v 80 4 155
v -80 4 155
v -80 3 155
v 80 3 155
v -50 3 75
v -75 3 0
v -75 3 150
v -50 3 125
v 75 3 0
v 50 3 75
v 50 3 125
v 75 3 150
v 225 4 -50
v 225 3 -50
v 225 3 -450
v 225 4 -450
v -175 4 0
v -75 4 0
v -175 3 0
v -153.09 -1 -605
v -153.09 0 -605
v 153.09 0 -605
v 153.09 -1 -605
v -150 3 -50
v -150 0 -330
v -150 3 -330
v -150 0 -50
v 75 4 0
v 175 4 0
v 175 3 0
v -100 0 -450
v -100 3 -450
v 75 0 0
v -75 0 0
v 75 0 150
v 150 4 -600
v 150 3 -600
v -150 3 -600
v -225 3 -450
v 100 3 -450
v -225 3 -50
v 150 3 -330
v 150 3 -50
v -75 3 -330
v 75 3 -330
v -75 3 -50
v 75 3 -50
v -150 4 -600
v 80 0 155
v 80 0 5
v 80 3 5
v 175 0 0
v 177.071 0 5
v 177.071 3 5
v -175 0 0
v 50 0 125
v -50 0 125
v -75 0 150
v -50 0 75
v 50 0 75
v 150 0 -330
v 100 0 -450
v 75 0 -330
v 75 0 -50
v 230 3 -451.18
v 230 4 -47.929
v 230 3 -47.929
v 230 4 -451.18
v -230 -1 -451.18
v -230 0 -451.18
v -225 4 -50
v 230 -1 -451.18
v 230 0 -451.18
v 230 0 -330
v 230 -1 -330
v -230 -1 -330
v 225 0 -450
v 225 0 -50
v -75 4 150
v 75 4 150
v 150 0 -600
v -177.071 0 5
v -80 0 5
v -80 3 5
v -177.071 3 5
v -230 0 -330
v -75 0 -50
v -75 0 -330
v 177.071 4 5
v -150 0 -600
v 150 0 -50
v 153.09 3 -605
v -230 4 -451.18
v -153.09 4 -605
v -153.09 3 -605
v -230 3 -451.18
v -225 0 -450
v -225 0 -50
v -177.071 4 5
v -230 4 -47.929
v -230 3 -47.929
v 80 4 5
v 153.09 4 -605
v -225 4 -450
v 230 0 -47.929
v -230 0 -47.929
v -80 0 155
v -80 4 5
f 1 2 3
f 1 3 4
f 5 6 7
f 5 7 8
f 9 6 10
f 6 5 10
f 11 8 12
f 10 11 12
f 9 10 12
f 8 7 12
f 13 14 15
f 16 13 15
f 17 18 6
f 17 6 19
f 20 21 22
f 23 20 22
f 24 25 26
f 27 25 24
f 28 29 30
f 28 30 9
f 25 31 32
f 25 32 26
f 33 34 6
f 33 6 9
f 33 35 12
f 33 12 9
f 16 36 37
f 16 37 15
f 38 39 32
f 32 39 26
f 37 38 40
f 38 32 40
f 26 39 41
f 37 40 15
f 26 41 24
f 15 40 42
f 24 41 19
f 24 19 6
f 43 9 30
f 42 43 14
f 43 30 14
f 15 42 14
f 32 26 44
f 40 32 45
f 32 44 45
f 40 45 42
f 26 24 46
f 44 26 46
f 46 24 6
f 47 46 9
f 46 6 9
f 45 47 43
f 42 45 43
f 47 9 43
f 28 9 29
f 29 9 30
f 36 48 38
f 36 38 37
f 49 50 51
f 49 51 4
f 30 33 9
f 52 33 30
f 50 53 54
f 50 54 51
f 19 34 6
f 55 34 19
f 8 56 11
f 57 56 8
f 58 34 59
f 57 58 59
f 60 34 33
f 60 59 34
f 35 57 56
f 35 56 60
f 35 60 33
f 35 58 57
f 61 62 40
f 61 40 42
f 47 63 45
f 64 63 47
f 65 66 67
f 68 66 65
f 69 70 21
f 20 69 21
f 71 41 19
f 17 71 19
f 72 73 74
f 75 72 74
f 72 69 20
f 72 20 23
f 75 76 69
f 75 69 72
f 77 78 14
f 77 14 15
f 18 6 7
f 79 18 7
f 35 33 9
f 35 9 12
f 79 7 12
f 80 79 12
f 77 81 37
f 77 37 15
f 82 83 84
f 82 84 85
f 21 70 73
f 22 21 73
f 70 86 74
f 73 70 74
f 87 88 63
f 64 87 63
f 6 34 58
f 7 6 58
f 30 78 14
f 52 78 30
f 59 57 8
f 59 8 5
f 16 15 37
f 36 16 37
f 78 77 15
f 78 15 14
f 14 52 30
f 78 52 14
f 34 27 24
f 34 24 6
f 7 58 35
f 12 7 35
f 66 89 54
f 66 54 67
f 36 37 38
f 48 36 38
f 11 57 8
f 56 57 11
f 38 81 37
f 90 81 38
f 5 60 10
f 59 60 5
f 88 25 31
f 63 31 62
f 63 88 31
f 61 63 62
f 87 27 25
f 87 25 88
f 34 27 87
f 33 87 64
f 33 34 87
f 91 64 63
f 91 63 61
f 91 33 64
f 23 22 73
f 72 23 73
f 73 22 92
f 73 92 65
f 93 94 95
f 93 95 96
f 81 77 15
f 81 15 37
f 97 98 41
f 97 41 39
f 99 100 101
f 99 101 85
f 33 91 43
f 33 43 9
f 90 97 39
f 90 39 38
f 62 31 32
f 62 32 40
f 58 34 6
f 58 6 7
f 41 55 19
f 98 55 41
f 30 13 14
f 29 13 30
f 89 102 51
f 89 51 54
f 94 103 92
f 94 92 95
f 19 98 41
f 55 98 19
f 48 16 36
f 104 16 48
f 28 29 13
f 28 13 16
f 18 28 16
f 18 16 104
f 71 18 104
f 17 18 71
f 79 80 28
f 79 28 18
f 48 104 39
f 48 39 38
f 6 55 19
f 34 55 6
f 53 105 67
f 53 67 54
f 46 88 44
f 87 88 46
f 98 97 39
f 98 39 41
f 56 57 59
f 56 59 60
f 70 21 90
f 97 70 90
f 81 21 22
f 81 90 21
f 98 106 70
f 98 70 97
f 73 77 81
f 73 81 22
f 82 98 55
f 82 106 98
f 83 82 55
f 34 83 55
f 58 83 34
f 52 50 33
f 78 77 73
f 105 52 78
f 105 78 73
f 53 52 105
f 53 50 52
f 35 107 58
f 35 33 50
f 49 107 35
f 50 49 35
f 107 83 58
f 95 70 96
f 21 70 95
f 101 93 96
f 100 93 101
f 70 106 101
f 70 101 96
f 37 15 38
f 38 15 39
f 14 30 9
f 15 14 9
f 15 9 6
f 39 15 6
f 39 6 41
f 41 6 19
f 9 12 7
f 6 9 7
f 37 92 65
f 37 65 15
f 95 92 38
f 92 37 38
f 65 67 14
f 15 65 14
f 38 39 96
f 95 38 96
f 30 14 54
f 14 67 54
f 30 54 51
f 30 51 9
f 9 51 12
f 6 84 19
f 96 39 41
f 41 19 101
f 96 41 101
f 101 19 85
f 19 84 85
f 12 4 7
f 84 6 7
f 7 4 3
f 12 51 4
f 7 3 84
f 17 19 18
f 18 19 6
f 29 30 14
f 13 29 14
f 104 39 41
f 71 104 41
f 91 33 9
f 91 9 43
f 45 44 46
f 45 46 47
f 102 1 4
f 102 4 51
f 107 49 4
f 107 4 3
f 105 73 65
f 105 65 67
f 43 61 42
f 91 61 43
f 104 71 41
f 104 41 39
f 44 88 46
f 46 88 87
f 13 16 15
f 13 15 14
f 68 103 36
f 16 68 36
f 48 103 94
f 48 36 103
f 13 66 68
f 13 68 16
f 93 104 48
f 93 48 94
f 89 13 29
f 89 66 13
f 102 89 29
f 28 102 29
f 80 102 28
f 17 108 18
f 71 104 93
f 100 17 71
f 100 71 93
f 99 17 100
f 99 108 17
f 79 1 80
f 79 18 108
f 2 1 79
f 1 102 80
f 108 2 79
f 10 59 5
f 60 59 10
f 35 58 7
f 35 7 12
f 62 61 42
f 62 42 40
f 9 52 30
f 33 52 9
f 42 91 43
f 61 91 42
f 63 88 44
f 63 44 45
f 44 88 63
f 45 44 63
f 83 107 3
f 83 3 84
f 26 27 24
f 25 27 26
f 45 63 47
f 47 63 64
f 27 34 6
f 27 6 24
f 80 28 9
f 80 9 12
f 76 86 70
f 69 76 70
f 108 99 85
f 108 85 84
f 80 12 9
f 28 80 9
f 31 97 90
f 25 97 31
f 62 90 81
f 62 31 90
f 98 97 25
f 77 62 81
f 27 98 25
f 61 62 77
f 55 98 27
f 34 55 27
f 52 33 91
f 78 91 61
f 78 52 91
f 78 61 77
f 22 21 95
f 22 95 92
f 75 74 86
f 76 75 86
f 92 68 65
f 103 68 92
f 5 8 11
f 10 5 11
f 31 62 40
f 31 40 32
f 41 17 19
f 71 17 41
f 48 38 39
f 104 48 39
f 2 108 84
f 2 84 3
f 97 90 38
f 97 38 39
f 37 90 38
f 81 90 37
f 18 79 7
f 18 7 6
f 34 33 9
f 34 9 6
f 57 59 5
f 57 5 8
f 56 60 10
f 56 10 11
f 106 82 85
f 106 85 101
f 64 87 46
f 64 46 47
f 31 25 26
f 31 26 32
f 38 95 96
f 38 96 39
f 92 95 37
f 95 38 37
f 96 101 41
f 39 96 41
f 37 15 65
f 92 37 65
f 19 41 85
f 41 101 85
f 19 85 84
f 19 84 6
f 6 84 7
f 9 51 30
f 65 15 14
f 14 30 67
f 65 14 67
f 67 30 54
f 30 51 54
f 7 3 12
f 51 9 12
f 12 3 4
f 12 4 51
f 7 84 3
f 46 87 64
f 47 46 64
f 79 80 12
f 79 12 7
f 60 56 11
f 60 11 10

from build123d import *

# Parameters (mm, degrees)
F1_DEPTH  = 3
F2_W      = 150
F2_H      = 150
F3_DEPTH  = 3
F4_W      = 150
F4_H      = 280
F5_DEPTH  = 3
F6_W      = 150
F6_H      = 280
F7_DEPTH  = 3
F9_DEPTH  = 3
F11_DEPTH = 3
F13_DEPTH = 1
F15_DEPTH = 1
F17_DEPTH = 1


with BuildPart() as f1:
    # F0 (on Front) → F1 (new body)
    with BuildSketch(Plane.XZ):
        Polygon((50, 125), (0, 125), (-50, 125), (-50, 100), (-50, 75), (0, 75), (50, 75), (50, 100), align=None)
    extrude(amount=-F1_DEPTH)


with BuildPart() as f3:
    # F2 (on Front) → F3 (new body)
    with BuildSketch(Plane.XZ):
        with Locations((0, 75)):
            Rectangle(F2_W, F2_H)
        Polygon((-50, 125), (0, 125), (50, 125), (50, 100), (50, 75), (0, 75), (-50, 75), (-50, 100), align=None, mode=Mode.SUBTRACT)
    extrude(amount=-F3_DEPTH)


with BuildPart() as f5:
    # F4 (on Front) → F5 (new body)
    with BuildSketch(Plane.XZ):
        with Locations((0, -190)):
            Rectangle(F4_W, F4_H)
    extrude(amount=-F5_DEPTH)


with BuildPart() as f7:
    # F6 (on Front) → F7 (new body)
    with BuildSketch(Plane.XZ):
        Polygon((75, 0), (-75, 0), (-150, -50), (-150, -330), (-100, -450), (100, -450), (150, -330), (150, -50), align=None)
        with Locations((0, -190)):
            Rectangle(F6_W, F6_H, mode=Mode.SUBTRACT)
    extrude(amount=-F7_DEPTH)


with BuildPart() as f9:
    # F8 (on face) → F9 (new body)
    with BuildSketch(Plane.XZ):
        Polygon((175, 0), (75, 0), (150, -50), (150, -330), (100, -450), (-100, -450), (-150, -330), (-150, -50), (-75, 0), (-175, 0), (-225, -50), (-225, -450), (-150, -600), (150, -600), (225, -450), (225, -50), align=None)
    extrude(amount=-F9_DEPTH)


with BuildPart() as f11:
    # F10 (on face) → F11 (new body)
    with BuildSketch(Plane.XZ):
        Polygon((230, -47.928932), (177.071068, 5), (80, 5), (80, 155), (-80, 155), (-80, 5), (-177.071068, 5), (-230, -47.928932), (-230, -451.18034), (-153.09017, -605), (153.09017, -605), (230, -451.18034), align=None)
        Polygon((-75, 150), (75, 150), (75, 0), (175, 0), (225, -50), (225, -450), (150, -600), (-150, -600), (-225, -450), (-225, -50), (-175, 0), (-75, 0), align=None, mode=Mode.SUBTRACT)
    extrude(amount=-F11_DEPTH)


with BuildPart() as f13:
    # F12 (on face) → F13 (new body)
    with BuildSketch(Plane(origin=(0, 3, 0), x_dir=(-1, 0, 0), z_dir=(0, 1, 0))):
        Polygon((75, 0), (75, 150), (-75, 150), (-75, 0), (-175, 0), (-225, -50), (-225, -450), (-150, -600), (150, -600), (225, -450), (225, -50), (175, 0), align=None)
    extrude(amount=F13_DEPTH)


with BuildPart() as f15:
    # F14 (on face) → F15 (new body)
    with BuildSketch(Plane(origin=(0, 4, 0), x_dir=(-1, 0, 0), z_dir=(0, 1, 0))):
        Polygon((80, 155), (-80, 155), (-80, 5), (-177.071068, 5), (-230, -47.928932), (-230, -451.18034), (-153.09017, -605), (153.09017, -605), (230, -451.18034), (230, -47.928932), (177.071068, 5), (80, 5), align=None)
        Polygon((-75, 0), (-75, 150), (75, 150), (75, 0), (175, 0), (225, -50), (225, -450), (150, -600), (-150, -600), (-225, -450), (-225, -50), (-175, 0), align=None, mode=Mode.SUBTRACT)
    extrude(amount=-F15_DEPTH)


with BuildPart() as f17:
    # F16 (on face) → F17 (new body)
    with BuildSketch(Plane.XZ):
        Polygon((-230, -451.18034), (-153.09017, -605), (153.09017, -605), (230, -451.18034), (230, -330), (-230, -330), align=None)
    extrude(amount=F17_DEPTH)


solid = Compound([f1.part, f3.part, f5.part, f7.part, f9.part, f11.part, f13.part, f15.part, f17.part])
